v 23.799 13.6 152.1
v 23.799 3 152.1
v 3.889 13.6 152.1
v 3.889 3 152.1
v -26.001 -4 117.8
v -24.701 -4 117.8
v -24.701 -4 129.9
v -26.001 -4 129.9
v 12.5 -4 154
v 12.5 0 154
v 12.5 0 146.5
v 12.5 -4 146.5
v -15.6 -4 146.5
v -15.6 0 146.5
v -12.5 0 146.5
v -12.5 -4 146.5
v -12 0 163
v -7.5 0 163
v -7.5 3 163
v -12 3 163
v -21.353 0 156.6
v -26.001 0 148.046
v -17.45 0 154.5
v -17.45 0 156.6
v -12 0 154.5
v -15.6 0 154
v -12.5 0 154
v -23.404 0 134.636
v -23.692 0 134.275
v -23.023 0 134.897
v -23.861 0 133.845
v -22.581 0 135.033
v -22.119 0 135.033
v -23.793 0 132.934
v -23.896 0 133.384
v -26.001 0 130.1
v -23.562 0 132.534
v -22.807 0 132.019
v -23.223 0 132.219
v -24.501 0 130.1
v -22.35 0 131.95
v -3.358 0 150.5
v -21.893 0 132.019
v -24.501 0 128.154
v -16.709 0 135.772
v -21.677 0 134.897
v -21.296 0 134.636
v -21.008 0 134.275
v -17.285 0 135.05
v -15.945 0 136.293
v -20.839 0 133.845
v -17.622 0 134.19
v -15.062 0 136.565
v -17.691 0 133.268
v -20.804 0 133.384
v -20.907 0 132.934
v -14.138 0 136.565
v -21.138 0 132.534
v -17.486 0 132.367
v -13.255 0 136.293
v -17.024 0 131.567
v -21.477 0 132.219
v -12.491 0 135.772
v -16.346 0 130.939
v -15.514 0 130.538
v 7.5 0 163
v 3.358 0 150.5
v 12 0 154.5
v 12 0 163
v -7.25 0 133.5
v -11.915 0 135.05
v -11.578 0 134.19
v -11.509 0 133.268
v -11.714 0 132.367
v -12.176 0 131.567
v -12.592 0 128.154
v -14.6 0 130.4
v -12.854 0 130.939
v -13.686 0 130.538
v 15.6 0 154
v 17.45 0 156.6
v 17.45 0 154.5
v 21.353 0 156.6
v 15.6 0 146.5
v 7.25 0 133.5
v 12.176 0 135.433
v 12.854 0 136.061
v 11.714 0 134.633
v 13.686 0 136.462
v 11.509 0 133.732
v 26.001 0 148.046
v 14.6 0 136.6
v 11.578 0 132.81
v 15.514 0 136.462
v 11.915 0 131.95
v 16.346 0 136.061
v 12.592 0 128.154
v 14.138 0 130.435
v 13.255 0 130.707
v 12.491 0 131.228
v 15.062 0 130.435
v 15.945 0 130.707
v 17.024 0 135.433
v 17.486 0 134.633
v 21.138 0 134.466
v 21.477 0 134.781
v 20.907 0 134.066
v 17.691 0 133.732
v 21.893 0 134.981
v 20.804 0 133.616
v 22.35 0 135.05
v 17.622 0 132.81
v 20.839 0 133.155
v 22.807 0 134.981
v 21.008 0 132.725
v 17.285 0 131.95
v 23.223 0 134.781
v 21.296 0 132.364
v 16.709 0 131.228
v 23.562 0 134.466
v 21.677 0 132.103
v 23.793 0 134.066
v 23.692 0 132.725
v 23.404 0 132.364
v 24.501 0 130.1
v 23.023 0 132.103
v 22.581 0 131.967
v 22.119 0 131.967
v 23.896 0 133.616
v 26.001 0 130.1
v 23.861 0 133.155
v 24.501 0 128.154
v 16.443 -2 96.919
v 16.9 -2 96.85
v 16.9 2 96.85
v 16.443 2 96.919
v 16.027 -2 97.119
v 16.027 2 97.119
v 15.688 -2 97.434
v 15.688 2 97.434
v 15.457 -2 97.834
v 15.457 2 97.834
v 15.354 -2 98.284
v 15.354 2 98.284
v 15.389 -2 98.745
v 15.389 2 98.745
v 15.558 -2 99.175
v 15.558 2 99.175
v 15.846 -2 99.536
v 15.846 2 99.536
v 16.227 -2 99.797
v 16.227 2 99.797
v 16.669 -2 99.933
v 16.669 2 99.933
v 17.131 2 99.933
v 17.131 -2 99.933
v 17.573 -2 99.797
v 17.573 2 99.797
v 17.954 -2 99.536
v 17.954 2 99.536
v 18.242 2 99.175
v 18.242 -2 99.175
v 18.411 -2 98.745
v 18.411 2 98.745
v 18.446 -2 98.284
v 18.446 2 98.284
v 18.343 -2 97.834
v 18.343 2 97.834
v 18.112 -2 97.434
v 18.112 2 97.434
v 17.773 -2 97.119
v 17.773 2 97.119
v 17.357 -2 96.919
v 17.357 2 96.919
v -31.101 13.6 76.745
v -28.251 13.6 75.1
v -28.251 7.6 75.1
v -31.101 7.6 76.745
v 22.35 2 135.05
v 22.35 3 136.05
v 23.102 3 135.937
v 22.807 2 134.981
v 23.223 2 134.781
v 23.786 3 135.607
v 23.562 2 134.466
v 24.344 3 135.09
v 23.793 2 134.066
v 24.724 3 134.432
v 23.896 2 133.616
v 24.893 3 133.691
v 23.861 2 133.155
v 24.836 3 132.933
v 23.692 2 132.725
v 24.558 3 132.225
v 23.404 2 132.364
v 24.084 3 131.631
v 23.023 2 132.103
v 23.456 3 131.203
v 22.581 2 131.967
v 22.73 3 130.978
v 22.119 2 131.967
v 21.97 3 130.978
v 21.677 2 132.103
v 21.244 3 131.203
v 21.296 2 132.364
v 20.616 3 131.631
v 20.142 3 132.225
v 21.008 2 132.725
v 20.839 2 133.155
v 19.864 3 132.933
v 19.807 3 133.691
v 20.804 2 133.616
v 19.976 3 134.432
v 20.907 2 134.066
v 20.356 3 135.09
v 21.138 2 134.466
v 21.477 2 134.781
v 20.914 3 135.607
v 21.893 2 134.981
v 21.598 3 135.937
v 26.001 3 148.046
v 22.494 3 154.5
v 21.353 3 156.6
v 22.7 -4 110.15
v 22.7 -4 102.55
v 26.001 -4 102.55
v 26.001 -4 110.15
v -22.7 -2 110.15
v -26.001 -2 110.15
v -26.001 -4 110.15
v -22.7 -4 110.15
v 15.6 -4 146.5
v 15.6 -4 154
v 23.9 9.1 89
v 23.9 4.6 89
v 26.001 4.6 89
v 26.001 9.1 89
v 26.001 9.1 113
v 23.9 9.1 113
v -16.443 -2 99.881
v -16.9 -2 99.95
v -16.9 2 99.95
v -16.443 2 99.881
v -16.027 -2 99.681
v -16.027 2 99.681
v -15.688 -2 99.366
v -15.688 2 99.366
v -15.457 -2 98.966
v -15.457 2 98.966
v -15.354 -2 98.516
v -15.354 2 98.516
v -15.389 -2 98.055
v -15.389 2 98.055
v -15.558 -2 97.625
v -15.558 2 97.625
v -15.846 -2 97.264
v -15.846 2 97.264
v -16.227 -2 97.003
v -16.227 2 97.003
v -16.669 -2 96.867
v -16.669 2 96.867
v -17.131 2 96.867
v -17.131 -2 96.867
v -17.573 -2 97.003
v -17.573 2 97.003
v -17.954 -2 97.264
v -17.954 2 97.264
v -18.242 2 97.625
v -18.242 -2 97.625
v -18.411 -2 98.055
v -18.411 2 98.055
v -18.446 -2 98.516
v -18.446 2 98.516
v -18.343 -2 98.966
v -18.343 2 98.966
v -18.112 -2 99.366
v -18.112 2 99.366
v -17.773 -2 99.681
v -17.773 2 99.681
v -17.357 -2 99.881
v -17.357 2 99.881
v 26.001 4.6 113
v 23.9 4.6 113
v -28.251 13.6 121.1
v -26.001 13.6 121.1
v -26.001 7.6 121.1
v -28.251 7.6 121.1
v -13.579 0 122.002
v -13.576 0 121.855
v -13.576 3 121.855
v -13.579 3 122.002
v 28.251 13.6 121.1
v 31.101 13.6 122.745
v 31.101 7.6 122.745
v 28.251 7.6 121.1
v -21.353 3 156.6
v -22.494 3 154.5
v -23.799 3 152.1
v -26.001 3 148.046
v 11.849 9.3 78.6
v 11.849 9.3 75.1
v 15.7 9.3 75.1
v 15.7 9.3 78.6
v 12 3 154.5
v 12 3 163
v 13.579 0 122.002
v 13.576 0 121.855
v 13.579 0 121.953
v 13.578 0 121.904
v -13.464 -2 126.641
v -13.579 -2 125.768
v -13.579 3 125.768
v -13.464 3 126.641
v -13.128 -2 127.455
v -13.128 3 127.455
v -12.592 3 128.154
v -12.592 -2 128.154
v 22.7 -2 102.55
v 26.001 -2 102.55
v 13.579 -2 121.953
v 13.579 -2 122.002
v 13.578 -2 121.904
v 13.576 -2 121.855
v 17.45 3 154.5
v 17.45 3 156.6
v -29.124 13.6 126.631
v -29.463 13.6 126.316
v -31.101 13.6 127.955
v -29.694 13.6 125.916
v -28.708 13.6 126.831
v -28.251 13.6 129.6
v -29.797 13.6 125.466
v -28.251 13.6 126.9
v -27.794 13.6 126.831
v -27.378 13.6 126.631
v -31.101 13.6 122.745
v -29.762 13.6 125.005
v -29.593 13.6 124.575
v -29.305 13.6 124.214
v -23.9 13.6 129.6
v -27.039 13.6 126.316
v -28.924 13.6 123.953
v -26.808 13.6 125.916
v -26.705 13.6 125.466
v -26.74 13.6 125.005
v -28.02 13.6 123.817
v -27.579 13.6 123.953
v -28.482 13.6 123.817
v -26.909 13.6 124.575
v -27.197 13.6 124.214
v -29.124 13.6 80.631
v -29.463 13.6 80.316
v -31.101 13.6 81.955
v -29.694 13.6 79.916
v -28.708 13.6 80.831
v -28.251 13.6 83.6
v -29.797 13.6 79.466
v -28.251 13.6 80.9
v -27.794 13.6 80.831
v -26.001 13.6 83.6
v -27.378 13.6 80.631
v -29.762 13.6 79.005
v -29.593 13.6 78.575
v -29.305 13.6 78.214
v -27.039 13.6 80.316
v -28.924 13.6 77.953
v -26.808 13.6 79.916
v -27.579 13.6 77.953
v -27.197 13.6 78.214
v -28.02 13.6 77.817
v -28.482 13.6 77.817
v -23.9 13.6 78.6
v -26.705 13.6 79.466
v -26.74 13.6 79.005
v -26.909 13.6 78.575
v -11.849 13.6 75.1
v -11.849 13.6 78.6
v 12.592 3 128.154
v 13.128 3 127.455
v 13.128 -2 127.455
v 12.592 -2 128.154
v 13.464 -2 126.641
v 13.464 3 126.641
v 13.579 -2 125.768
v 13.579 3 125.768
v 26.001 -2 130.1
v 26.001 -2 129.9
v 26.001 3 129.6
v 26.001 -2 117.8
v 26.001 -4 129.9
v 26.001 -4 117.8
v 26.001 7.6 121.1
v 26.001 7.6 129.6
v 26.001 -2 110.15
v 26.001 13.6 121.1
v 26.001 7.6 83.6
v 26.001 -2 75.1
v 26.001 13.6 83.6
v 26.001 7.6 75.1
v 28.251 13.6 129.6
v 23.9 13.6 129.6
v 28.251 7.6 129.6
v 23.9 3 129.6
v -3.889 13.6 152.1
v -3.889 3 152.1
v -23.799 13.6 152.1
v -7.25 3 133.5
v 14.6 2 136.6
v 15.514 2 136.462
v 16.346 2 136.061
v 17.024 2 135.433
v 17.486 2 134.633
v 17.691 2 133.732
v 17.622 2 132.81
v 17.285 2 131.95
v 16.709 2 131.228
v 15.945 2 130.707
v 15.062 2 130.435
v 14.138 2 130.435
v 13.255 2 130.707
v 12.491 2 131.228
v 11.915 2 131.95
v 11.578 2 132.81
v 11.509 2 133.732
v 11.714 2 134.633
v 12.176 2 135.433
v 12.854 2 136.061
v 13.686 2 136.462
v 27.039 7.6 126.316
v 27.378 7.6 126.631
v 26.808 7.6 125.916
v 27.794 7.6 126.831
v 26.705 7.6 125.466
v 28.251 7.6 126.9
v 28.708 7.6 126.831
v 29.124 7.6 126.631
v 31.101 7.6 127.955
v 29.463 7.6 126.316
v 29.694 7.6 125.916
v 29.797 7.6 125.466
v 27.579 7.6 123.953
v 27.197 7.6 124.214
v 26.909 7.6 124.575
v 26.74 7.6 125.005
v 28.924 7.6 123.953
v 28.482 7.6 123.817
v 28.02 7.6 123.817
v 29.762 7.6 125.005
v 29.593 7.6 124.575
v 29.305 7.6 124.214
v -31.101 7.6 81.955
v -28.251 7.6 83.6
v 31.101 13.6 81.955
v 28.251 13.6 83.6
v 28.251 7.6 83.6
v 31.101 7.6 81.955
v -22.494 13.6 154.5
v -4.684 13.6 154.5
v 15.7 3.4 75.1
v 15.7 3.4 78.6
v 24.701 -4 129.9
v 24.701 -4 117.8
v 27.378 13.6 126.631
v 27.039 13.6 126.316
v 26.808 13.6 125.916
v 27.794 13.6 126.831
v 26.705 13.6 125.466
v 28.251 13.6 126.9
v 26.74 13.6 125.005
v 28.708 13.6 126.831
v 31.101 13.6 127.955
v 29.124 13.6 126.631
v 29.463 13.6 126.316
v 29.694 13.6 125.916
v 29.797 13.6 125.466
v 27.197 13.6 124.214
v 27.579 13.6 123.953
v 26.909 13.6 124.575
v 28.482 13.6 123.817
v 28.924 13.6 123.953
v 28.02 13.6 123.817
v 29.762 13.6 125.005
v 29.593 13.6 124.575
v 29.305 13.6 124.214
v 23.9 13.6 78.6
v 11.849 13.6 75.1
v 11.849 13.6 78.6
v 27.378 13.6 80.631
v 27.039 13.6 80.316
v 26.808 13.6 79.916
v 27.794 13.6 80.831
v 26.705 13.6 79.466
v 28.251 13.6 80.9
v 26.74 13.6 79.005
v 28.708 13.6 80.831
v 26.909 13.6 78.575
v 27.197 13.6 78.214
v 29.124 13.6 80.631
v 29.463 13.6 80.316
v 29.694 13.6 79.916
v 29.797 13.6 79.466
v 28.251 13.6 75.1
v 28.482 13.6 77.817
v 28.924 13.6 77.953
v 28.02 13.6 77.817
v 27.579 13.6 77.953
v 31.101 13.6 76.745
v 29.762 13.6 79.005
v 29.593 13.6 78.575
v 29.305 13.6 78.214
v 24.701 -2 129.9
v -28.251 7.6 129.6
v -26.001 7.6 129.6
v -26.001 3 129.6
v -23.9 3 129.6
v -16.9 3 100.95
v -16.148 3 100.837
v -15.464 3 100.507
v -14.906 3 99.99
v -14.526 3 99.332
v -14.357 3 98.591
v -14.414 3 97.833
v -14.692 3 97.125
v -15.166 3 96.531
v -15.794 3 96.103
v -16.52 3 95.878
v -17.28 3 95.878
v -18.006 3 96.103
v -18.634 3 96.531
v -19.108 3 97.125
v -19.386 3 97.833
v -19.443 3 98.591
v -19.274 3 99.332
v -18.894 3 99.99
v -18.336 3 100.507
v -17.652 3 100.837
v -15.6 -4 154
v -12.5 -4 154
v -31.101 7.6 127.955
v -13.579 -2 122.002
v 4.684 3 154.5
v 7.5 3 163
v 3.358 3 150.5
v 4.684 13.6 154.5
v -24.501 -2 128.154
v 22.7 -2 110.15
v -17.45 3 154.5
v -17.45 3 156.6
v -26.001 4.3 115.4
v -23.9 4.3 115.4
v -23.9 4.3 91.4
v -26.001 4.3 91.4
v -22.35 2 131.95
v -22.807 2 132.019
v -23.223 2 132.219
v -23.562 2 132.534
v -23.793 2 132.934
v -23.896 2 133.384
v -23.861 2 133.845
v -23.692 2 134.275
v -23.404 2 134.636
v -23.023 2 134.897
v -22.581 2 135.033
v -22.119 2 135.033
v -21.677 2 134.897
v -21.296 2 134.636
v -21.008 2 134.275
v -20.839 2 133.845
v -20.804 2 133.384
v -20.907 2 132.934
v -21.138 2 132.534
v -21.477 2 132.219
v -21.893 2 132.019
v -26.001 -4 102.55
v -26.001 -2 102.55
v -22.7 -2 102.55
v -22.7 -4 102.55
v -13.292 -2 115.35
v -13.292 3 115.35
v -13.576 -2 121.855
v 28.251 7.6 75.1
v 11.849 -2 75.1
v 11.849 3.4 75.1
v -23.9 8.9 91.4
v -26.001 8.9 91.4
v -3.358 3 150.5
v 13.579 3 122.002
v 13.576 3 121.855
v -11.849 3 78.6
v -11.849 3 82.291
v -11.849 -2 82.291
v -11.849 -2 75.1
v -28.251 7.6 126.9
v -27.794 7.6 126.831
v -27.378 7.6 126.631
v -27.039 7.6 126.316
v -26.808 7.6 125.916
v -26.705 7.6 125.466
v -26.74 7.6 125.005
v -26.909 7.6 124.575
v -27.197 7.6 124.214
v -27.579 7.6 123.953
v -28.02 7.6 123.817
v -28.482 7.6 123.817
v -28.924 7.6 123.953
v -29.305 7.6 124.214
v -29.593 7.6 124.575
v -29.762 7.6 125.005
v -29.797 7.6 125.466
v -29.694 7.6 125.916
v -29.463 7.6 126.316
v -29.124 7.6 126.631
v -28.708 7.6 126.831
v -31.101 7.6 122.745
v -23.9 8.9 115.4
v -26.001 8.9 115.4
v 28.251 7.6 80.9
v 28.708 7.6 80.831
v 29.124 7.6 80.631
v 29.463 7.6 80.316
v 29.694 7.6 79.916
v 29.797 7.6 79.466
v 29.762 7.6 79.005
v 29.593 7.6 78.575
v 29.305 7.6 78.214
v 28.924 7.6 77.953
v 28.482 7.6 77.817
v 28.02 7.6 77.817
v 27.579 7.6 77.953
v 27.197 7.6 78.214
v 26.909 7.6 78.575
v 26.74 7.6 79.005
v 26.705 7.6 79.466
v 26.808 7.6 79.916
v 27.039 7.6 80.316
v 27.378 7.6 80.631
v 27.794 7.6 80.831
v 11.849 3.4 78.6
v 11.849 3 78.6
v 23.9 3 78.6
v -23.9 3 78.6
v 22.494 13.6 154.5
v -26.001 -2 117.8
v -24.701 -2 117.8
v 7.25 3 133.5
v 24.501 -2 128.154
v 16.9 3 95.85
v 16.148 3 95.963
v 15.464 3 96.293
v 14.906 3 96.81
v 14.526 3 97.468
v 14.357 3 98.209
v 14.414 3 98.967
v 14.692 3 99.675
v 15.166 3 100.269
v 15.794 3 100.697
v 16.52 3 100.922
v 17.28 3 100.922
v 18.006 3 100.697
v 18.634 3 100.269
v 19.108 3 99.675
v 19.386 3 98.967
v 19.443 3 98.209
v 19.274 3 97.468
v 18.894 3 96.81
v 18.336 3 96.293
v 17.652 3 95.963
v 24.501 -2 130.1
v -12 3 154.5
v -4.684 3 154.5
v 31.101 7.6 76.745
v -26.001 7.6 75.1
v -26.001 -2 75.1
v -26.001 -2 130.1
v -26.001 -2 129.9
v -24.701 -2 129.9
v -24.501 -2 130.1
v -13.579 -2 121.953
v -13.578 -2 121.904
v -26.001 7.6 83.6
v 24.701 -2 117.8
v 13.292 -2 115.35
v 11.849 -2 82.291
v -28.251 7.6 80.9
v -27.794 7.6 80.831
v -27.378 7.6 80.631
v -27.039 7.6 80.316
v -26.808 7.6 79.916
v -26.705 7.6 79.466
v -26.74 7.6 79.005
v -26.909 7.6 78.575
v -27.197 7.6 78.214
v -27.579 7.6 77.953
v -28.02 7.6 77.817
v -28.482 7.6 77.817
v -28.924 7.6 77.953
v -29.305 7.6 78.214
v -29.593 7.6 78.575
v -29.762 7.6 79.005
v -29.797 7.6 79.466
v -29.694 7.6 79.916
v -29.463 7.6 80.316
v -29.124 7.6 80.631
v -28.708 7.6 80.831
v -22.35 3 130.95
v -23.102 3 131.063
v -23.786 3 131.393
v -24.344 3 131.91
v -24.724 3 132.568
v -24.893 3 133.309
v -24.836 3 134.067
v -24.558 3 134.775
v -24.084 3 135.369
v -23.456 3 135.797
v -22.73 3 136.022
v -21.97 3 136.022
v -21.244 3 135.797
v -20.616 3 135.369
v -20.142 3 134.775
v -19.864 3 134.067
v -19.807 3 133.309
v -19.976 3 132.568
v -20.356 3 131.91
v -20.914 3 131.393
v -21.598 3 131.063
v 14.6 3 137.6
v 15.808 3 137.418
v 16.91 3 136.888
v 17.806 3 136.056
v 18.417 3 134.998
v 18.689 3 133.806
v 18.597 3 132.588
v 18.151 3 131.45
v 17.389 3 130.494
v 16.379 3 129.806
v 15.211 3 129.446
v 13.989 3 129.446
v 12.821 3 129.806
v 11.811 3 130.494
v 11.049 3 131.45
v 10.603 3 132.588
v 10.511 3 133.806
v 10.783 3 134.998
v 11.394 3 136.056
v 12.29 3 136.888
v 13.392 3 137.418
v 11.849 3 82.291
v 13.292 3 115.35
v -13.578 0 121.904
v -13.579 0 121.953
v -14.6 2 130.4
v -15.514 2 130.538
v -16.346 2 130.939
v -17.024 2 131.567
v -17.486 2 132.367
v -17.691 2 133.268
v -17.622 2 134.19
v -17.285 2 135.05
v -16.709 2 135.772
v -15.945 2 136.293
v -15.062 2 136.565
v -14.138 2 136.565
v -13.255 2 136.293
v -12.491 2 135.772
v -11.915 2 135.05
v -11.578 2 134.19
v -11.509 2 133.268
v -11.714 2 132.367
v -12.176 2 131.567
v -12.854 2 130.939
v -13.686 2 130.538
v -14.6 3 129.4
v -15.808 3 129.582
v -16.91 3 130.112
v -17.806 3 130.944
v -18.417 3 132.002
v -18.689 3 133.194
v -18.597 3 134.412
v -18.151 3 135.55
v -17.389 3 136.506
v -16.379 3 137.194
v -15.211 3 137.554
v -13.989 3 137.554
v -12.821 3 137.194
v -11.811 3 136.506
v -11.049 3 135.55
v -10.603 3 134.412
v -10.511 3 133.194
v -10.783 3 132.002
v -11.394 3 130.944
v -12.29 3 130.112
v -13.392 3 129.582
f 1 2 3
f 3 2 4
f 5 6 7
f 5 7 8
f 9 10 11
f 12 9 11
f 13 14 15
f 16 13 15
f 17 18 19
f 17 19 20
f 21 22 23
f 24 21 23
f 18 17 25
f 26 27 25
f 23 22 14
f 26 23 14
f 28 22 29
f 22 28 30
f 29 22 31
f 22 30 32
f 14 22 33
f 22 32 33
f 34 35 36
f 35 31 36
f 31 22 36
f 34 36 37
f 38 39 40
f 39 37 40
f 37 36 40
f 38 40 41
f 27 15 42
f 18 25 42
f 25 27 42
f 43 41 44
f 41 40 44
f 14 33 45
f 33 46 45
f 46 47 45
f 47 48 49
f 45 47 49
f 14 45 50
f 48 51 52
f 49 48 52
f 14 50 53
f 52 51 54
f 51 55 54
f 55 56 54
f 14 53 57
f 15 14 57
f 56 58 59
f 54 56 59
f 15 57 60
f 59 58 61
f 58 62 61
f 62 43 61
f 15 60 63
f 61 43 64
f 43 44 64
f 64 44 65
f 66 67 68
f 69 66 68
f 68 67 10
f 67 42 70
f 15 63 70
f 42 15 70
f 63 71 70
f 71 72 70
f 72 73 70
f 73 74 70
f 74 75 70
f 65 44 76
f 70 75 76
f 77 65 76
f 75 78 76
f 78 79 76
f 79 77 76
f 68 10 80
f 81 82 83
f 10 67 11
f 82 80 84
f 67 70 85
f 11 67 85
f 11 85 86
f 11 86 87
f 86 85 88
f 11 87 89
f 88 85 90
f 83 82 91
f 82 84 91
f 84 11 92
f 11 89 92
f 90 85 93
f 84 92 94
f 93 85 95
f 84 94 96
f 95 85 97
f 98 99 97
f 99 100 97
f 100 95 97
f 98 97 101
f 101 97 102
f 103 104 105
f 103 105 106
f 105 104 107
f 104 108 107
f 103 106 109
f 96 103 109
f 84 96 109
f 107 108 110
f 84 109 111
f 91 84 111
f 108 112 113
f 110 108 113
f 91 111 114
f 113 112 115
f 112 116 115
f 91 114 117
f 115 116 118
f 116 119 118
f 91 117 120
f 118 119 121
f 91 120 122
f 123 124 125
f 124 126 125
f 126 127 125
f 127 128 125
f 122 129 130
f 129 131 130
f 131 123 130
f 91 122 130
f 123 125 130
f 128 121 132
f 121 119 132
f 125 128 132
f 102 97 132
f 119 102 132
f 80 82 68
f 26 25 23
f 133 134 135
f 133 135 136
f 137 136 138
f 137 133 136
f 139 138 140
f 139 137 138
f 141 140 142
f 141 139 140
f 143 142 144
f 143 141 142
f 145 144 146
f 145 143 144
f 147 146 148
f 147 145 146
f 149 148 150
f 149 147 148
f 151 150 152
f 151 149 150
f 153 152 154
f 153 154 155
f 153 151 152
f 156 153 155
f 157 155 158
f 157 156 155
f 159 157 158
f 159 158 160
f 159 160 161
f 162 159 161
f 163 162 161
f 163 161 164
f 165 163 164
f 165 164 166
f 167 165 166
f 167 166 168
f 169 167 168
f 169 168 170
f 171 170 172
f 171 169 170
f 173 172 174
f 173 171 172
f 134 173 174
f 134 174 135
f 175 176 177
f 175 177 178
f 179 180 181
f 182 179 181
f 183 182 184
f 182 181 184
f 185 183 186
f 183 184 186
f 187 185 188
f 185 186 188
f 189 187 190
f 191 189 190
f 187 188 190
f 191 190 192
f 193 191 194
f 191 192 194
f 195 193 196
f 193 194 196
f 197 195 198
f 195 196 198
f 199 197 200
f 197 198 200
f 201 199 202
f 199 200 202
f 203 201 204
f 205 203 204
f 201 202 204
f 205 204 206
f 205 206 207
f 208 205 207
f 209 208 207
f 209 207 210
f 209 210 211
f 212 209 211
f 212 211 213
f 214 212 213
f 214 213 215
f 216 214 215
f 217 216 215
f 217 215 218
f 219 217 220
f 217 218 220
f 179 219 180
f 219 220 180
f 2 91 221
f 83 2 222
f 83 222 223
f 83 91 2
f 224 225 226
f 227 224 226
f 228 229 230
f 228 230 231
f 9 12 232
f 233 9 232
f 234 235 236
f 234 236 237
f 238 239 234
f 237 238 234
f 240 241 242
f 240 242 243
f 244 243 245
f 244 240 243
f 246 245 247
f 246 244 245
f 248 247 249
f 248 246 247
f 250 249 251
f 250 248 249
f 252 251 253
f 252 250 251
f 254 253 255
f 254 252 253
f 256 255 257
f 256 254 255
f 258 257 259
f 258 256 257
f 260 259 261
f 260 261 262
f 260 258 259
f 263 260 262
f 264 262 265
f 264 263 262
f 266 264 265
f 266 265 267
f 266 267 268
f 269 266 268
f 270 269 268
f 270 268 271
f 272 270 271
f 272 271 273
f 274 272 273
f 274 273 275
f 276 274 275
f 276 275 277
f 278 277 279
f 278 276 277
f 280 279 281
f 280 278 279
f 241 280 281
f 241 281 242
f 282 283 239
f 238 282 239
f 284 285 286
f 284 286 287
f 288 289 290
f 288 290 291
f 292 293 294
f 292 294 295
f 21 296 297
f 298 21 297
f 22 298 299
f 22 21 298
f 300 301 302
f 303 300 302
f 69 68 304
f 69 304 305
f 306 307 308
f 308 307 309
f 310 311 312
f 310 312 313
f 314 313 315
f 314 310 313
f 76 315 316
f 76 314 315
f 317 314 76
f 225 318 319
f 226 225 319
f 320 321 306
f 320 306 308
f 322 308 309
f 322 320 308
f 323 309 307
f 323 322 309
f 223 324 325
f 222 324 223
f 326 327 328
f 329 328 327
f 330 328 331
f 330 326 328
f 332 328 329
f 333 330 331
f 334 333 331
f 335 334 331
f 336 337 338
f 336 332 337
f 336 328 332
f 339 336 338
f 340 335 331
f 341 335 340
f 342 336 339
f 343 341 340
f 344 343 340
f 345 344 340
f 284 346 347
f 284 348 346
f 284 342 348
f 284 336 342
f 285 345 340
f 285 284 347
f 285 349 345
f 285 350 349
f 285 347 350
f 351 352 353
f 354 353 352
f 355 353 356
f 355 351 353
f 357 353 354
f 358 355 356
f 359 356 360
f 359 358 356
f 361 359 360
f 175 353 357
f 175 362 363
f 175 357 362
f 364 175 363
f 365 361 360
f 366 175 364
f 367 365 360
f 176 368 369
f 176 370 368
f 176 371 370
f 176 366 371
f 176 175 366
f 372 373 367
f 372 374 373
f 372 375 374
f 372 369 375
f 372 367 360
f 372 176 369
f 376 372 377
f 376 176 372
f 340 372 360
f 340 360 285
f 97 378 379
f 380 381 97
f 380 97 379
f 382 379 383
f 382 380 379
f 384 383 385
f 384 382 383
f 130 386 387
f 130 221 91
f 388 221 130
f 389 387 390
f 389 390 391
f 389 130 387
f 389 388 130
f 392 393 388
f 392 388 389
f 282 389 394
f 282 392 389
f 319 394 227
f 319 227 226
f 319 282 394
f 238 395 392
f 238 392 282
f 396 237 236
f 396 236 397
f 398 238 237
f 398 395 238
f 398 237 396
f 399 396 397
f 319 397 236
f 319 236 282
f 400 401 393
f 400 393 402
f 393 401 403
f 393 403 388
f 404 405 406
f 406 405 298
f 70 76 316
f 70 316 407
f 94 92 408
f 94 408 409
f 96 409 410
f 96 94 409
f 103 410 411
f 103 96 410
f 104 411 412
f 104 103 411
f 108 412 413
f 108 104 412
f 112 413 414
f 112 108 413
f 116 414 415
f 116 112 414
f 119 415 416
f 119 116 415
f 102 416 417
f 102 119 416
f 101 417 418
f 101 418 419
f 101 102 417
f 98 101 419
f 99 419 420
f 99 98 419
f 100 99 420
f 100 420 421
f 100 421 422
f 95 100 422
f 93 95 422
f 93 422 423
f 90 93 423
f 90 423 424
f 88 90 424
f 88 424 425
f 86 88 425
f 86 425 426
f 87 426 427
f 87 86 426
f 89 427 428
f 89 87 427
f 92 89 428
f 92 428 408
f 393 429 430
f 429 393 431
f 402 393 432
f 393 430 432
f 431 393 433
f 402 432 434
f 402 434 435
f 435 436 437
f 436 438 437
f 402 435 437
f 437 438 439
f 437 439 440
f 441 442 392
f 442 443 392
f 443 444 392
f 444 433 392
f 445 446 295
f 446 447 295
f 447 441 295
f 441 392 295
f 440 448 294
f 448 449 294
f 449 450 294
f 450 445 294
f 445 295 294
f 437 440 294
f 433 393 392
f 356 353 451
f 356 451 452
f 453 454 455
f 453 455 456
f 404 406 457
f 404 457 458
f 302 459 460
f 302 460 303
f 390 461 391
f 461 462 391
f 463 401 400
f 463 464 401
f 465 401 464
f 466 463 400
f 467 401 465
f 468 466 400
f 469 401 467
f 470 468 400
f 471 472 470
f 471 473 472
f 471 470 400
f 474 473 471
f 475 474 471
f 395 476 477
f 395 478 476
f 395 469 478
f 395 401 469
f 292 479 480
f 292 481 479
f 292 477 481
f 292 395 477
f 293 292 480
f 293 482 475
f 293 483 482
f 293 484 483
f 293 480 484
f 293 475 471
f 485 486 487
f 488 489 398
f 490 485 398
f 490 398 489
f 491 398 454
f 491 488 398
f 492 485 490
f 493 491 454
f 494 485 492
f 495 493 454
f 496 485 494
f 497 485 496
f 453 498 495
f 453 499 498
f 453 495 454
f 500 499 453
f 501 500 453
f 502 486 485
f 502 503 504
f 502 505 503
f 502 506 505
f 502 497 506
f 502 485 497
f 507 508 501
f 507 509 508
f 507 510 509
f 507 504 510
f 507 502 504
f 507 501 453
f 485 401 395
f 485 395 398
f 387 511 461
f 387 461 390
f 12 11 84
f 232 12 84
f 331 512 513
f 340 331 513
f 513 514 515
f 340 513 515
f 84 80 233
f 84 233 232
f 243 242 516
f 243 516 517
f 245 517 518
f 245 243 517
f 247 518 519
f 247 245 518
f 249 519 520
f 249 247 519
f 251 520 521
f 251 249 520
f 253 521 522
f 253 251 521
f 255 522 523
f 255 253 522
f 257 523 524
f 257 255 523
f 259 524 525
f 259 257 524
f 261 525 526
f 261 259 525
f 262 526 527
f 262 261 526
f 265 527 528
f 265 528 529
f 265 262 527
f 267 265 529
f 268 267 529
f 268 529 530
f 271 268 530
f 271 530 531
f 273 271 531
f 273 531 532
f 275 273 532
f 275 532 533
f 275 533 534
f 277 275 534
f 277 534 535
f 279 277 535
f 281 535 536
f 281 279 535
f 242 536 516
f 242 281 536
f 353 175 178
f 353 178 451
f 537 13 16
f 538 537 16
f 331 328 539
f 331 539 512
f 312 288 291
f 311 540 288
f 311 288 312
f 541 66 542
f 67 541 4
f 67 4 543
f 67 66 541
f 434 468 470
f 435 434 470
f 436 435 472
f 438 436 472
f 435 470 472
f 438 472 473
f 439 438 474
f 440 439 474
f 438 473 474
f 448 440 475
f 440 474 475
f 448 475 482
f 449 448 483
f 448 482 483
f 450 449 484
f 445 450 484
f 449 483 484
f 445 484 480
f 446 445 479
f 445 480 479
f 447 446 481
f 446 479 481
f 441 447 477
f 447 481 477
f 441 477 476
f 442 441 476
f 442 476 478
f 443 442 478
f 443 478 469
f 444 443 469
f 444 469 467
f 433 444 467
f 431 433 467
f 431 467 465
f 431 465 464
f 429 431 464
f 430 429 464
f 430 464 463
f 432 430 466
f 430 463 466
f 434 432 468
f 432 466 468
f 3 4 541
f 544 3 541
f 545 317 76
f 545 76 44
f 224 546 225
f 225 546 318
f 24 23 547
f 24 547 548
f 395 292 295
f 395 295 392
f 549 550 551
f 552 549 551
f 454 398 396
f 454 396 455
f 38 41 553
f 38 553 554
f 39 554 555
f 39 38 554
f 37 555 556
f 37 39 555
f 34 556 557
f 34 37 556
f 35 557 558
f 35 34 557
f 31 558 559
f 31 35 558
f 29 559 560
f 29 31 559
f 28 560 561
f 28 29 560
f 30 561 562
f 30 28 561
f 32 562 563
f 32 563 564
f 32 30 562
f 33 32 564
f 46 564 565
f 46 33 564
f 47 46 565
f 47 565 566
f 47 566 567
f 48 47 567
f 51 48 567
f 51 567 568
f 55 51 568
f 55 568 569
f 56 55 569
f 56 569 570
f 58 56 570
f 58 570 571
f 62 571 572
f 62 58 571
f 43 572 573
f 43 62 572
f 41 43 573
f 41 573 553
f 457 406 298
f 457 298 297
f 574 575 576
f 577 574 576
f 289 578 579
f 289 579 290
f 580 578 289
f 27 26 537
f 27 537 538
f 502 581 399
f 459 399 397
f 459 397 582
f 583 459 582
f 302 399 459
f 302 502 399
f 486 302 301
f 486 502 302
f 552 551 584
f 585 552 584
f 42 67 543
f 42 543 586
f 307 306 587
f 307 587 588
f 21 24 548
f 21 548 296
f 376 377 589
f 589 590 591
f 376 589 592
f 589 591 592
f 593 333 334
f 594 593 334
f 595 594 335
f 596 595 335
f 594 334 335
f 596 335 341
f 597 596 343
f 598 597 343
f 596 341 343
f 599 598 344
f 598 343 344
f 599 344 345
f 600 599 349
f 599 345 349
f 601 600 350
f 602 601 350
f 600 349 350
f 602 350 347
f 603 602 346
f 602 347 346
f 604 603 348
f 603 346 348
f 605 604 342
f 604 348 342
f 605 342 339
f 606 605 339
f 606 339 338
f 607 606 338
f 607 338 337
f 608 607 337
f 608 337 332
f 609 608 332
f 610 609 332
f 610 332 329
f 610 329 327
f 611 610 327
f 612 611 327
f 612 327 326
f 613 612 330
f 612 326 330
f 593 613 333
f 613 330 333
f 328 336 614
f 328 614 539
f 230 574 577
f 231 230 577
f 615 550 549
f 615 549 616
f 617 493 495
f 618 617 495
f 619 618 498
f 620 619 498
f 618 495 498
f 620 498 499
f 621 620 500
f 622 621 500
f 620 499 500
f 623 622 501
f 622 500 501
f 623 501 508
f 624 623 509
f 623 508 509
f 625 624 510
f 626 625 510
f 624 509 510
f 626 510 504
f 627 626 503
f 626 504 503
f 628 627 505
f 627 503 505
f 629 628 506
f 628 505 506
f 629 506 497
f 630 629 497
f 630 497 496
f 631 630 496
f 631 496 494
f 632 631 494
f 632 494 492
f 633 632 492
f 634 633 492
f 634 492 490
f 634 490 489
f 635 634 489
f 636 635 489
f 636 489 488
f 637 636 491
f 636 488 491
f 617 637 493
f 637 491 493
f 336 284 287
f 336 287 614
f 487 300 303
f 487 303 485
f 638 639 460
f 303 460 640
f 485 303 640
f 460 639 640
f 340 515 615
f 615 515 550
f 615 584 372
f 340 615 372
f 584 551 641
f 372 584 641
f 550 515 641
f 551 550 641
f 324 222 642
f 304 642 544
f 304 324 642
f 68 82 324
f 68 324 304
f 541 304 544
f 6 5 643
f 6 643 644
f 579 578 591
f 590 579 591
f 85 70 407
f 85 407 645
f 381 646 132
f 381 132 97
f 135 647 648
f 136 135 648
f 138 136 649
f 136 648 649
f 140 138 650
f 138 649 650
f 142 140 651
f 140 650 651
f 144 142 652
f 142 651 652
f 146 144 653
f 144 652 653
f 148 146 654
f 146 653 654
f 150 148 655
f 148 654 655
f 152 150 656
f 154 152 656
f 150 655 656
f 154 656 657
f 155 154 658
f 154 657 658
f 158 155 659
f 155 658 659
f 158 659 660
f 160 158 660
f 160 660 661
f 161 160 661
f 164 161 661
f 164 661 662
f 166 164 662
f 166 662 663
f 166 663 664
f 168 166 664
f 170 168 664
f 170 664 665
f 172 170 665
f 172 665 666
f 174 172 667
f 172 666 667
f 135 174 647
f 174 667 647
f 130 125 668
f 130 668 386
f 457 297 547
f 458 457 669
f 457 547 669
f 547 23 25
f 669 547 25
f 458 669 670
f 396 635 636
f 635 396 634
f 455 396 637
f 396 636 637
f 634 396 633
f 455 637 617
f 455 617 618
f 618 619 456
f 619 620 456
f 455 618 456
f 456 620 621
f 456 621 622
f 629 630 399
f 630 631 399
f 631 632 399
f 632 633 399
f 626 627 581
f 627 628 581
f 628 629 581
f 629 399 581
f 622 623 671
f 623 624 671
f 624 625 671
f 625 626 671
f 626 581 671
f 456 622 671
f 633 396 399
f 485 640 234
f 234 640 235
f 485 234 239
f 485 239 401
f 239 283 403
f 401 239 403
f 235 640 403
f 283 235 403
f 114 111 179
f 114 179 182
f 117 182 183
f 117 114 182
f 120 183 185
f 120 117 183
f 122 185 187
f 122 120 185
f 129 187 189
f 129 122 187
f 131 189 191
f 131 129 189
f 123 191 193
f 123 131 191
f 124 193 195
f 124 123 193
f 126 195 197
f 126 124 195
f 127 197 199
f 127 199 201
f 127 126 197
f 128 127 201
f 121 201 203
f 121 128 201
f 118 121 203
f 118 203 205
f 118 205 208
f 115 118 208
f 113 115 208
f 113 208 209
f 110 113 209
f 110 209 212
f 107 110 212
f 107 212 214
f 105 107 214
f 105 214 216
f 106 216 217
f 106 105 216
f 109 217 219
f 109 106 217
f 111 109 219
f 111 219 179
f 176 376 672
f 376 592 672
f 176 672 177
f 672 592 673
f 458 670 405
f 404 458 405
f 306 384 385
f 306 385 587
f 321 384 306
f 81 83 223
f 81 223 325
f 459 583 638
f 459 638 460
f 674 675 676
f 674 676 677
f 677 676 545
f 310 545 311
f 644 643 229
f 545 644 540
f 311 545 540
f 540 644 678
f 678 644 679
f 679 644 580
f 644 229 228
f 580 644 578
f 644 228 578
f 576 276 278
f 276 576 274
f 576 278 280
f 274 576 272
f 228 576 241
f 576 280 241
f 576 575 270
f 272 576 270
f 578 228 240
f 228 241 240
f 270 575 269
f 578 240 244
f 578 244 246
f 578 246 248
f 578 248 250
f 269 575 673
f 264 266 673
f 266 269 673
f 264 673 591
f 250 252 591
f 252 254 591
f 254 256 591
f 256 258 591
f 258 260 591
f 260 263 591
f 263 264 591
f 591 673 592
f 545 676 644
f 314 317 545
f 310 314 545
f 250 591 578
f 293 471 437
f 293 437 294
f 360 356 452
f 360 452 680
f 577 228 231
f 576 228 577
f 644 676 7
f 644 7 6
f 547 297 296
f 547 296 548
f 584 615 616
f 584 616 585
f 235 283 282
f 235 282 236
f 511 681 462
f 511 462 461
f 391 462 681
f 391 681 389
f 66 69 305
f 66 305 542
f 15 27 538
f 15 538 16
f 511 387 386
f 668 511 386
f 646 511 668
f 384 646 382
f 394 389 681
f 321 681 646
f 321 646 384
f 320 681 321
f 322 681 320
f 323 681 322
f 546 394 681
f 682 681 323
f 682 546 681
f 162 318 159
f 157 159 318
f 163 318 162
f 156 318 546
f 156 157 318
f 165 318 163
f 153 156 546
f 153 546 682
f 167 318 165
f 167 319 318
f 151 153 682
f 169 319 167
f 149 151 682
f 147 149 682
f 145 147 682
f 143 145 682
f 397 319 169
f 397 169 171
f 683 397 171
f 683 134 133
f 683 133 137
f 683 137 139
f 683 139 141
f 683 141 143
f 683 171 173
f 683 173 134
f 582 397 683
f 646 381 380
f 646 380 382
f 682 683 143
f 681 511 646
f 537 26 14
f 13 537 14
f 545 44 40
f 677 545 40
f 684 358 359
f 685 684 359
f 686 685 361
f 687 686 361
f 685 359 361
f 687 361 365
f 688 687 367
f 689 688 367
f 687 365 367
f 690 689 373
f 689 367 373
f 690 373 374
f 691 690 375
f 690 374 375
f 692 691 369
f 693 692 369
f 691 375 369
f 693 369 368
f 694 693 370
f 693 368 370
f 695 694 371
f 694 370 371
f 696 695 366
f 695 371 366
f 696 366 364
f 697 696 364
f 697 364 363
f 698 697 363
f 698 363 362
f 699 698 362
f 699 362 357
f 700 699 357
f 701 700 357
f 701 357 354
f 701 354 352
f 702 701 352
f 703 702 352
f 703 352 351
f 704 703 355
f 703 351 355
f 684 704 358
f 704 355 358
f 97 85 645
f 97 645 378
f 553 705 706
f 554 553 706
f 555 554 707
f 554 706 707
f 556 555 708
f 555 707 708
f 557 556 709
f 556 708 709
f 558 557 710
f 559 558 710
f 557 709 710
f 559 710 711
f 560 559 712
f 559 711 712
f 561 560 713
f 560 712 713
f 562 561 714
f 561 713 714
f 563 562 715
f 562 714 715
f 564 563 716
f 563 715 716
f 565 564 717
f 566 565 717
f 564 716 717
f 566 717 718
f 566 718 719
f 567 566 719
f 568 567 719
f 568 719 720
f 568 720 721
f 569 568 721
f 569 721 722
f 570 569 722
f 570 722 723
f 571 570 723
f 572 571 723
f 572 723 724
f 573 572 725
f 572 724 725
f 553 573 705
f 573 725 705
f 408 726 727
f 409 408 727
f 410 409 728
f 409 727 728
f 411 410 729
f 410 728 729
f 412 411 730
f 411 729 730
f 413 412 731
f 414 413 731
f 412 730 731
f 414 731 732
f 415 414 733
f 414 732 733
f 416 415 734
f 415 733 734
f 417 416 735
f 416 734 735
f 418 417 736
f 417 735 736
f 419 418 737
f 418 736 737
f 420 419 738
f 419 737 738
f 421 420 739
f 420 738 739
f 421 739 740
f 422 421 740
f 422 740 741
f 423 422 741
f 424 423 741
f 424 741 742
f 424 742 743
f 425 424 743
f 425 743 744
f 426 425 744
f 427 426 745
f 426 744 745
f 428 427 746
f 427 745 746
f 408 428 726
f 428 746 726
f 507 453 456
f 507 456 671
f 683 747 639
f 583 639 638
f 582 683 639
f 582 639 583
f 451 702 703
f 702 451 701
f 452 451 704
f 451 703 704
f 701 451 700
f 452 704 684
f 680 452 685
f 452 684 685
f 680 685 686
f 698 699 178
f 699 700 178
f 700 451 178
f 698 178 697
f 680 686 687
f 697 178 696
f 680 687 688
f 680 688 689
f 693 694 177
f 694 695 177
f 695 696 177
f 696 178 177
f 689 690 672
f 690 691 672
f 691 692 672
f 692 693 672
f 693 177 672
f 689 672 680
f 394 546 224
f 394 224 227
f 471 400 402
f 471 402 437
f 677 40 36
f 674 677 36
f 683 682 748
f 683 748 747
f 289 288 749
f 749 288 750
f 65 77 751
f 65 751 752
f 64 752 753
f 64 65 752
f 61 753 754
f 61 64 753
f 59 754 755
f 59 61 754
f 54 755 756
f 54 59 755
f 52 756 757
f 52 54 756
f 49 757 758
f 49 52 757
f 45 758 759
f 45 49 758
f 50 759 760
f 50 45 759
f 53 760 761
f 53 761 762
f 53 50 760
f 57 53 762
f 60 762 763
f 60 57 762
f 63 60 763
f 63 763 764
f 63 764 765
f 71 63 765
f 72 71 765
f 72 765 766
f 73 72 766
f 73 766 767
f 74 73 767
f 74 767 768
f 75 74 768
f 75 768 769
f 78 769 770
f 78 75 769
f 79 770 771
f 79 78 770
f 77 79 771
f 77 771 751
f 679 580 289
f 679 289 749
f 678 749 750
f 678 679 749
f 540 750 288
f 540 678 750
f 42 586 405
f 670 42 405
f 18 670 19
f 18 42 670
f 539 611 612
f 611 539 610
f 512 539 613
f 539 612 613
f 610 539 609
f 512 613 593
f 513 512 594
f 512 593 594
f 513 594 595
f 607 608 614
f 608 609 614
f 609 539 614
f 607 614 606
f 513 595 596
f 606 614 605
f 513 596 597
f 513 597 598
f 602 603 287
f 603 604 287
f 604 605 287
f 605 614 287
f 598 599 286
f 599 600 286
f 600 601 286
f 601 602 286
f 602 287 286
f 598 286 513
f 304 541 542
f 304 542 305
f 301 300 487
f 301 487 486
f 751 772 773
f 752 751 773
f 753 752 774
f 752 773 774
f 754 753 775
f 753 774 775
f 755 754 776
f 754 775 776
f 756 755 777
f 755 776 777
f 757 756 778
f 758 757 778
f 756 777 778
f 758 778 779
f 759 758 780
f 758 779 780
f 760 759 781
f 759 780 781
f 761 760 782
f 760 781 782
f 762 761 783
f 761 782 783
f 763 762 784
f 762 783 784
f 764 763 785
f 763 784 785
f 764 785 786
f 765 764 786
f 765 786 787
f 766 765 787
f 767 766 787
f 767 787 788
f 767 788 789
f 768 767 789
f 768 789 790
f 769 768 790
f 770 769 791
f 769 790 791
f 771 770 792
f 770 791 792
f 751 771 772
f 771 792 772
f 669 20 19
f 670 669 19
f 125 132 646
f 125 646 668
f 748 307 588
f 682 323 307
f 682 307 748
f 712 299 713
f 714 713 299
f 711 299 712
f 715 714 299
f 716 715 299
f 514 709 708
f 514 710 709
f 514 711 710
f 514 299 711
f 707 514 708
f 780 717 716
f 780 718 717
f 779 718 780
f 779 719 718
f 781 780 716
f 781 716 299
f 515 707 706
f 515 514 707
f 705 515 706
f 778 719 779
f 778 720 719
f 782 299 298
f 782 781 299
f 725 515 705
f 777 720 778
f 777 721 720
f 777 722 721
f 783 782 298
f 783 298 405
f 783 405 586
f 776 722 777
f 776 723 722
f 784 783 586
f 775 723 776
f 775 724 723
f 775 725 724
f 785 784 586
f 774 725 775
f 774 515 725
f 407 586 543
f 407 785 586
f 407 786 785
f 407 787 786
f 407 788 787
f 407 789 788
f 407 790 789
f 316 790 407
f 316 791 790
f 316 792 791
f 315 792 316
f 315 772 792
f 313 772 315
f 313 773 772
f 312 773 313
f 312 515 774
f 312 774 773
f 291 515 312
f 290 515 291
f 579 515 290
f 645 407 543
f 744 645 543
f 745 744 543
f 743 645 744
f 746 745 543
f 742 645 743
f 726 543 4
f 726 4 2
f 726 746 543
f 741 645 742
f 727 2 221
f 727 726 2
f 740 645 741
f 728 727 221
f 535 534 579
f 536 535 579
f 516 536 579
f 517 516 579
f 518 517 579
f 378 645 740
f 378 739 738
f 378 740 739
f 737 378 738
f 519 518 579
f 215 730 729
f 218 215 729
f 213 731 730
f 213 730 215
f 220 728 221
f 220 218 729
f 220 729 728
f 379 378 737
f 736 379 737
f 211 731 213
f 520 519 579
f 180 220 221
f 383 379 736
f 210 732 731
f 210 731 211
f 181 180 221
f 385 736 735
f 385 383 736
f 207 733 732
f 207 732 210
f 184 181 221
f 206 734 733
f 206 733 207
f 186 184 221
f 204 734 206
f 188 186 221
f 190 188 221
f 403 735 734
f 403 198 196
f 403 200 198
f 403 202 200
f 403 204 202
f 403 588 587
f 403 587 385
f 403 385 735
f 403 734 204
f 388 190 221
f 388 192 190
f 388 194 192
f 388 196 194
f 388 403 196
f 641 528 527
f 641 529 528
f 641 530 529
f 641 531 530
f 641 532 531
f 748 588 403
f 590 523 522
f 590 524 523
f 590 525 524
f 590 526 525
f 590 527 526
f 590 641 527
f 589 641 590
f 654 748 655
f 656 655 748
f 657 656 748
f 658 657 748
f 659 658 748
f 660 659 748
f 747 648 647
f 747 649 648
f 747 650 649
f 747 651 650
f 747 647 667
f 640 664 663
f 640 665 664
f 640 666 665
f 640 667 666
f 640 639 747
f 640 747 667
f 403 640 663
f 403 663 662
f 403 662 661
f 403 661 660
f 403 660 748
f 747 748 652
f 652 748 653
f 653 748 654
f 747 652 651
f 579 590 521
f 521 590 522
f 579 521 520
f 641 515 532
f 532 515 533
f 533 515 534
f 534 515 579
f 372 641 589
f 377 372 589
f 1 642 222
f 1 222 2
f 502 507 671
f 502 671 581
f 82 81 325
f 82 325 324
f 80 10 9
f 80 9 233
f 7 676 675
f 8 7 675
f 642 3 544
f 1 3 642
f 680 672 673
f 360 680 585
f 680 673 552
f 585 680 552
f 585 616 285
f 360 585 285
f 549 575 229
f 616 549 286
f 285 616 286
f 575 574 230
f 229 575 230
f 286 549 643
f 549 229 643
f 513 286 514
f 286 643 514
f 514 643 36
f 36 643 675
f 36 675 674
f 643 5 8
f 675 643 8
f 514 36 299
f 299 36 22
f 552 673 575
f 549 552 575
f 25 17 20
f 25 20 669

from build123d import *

# Parameters (mm, degrees)
SKETCH_12157_R           = 1.55
SKETCH_12157_R_2         = 3.1
F_3MM_1_5MM_DEPTH        = 3
EXTRUDE_START            = -2
EXTRUDE_25031_DEPTH      = 2
SKETCH_5_W               = 4.1
SKETCH_5_H               = 8.5
SKETCH_5_W_2             = 3.1
SKETCH_5_H_2             = 7.5
EXTRUDE_32283_DEPTH      = 3
EXTRUDE_2_DEPTH          = 2
EXTRUDE_START_2          = 3
SKETCH_5_5_W             = 3.1
SKETCH_5_5_H             = 7.5
EXTRUDE_33009_DEPTH      = 7
EXTRUDE_34199_DEPTH      = 3
EXTRUDE_34199_DEPTH_BACK = 2
SKETCH2_R                = 1.55
SKETCH3_W                = 3.301126091
SKETCH3_H                = 7.6
SKETCH3_W_2              = 1.3
SKETCH3_H_2              = 12.1
EXTRUDE_40784_DEPTH      = 4
CHAMFER_40857_SIZE       = 1
EXTRUDE_42917_DEPTH      = 10.6
EXTRUDE_START_3          = 13.6
SKETCH_10_R              = 1.55
EXTRUDE_3_DEPTH          = 6
SKETCH_43735_W           = 24
SKETCH_43735_H           = 4.5
SKETCH_43735_W_2         = 23
SKETCH_43735_H_2         = 3.5
CUT_EXTRUDE_45378_DEPTH  = 167.496967072
SKETCH_44281_W           = 24
SKETCH_44281_H           = 4.6
SKETCH_44281_W_2         = 23
SKETCH_44281_H_2         = 3.6
CUT_EXTRUDE_45445_DEPTH  = 167.496967072
XT30_START               = 75.1
XT30_2_W                 = 11.2
XT30_2_H                 = 5.9
XT30_2_W_2               = 10.2
XT30_2_H_2               = 4.9
XT30_DEPTH               = 77


with BuildPart() as part:
    # Sketch 12157 → 基座_3mm_留线槽空间1.5mm (new body)
    with BuildSketch(Plane(origin=(0, 0, 0), x_dir=(1, 0, 0), z_dir=(0, 1, 0))):
        with BuildLine():
            Line((-24.501126091, -125.026398932), (-17.042092951, -115.35))
            Line((-17.042092951, -115.35), (-13.292092951, -115.35))
            Line((-13.292092951, -115.35), (-13.576089496, -121.85459027))
            Line((-13.576089496, -121.85459027), (-13.579301748, -122.001805703))
            Line((-13.579301748, -122.001805703), (-13.579301748, -125.768411616))
            ThreePointArc((-13.579301748, -125.768411616), (-13.322655903, -127.059338556), (-12.591750717, -128.153933031))
            Line((-12.591750717, -128.153933031), (-7.25, -133.5))
            Line((-7.25, -133.5), (7.25, -133.5))
            Line((7.25, -133.5), (12.591750717, -128.153933031))
            ThreePointArc((12.591750717, -128.153933031), (13.322655903, -127.059338556), (13.579301748, -125.768411616))
            Line((13.579301748, -125.768411616), (13.579301748, -122.001805703))
            Line((13.579301748, -122.001805703), (13.576089496, -121.85459027))
            Line((13.576089496, -121.85459027), (13.292092951, -115.35))
            Line((13.292092951, -115.35), (17.042092951, -115.35))
            Line((17.042092951, -115.35), (24.501126091, -125.026398932))
            Line((24.501126091, -125.026398932), (26.001126091, -126.6))
            Line((26.001126091, -126.6), (26.001126091, -130.1))
            Line((26.001126091, -130.1), (26.001126091, -148.0463267))
            Line((26.001126091, -148.0463267), (21.353443149, -156.6))
            Line((21.353443149, -156.6), (17.45, -156.6))
            Line((17.45, -156.6), (17.45, -154.5))
            Line((17.45, -154.5), (16.1, -154.5))
            Line((16.1, -154.5), (16.1, -146))
            Line((16.1, -146), (12, -146))
            Line((12, -146), (12, -163))
            Line((12, -163), (7.5, -163))
            Line((7.5, -163), (3.358391833, -150.5))
            Line((3.358391833, -150.5), (-3.358391833, -150.5))
            Line((-3.358391833, -150.5), (-7.5, -163))
            Line((-7.5, -163), (-12, -163))
            Line((-12, -163), (-12, -146))
            Line((-12, -146), (-16.1, -146))
            Line((-16.1, -146), (-16.1, -154.5))
            Line((-16.1, -154.5), (-17.45, -154.5))
            Line((-17.45, -154.5), (-17.45, -156.6))
            Line((-17.45, -156.6), (-21.353443149, -156.6))
            Line((-21.353443149, -156.6), (-26.001126091, -148.0463267))
            Line((-26.001126091, -148.0463267), (-26.001126091, -130.1))
            Line((-26.001126091, -130.1), (-26.001126091, -126.6))
            Line((-26.001126091, -126.6), (-24.501126091, -125.026398932))
        make_face()
        with Locations(Location((-22.35, -133.5, 0), (0, 0, 90))):
            Circle(SKETCH_12157_R, mode=Mode.SUBTRACT)
        with Locations(Location((-14.6, -133.5, 0), (0, 0, 90))):
            Circle(SKETCH_12157_R_2, mode=Mode.SUBTRACT)
        with Locations(Location((14.6, -133.5, 0), (0, 0, 270))):
            Circle(SKETCH_12157_R_2, mode=Mode.SUBTRACT)
        with Locations(Location((22.35, -133.5, 0), (0, 0, 270))):
            Circle(SKETCH_12157_R, mode=Mode.SUBTRACT)
    extrude(amount=F_3MM_1_5MM_DEPTH)

    # Sketch 24747 → Extrude 25031 (add)
    with BuildSketch(Plane(origin=(0, 0, 0), x_dir=(1, 0, 0), z_dir=(0, 1, 0)).offset(EXTRUDE_START)):
        with BuildLine():
            Line((13.292092951, -115.35), (17.042092951, -115.35))
            Line((17.042092951, -115.35), (24.501126091, -125.026398932))
            Line((24.501126091, -125.026398932), (24.501126091, -128.153933031))
            Line((24.501126091, -128.153933031), (12.591750717, -128.153933031))
            ThreePointArc((12.591750717, -128.153933031), (13.322655903, -127.059338556), (13.579301748, -125.768411616))
            Line((13.579301748, -125.768411616), (13.579301748, -122.001805703))
            ThreePointArc((13.579301748, -122.001805703), (13.578498589, -121.928180466), (13.576089496, -121.85459027))
            Line((13.576089496, -121.85459027), (13.292092951, -115.35))
        make_face()
        with BuildLine():
            Line((-13.292092951, -115.35), (-13.576089496, -121.85459027))
            ThreePointArc((-13.576089496, -121.85459027), (-13.578498589, -121.928180466), (-13.579301748, -122.001805703))
            Line((-13.579301748, -122.001805703), (-13.579301748, -125.768411616))
            ThreePointArc((-13.579301748, -125.768411616), (-13.322655903, -127.059338556), (-12.591750717, -128.153933031))
            Line((-12.591750717, -128.153933031), (-24.501126091, -128.153933031))
            Line((-24.501126091, -128.153933031), (-24.501126091, -125.026398932))
            Line((-24.501126091, -125.026398932), (-17.042092951, -115.35))
            Line((-17.042092951, -115.35), (-13.292092951, -115.35))
        make_face()
    extrude(amount=EXTRUDE_25031_DEPTH)

    # 草图5 → Extrude 32283 (add)
    # profile 1 of 8: a face of its own
    with BuildSketch(Plane(origin=(0, 0, 0), x_dir=(1, 0, 0), z_dir=(0, 1, 0))):
        with Locations((-14.05, -150.25)):
            Rectangle(SKETCH_5_W, SKETCH_5_H)
        with Locations((-14.05, -150.25)):
            Rectangle(SKETCH_5_W_2, SKETCH_5_H_2, mode=Mode.SUBTRACT)
    # profile 2 of 8: a face of its own
    with BuildSketch(Plane(origin=(0, 0, 0), x_dir=(1, 0, 0), z_dir=(0, 1, 0))):
        with Locations((-14.05, -150.25)):
            Rectangle(SKETCH_5_W_2, SKETCH_5_H_2)
    # profile 3 of 8: a face of its own
    with BuildSketch(Plane(origin=(0, 0, 0), x_dir=(1, 0, 0), z_dir=(0, 1, 0))):
        with Locations((14.05, -150.25)):
            Rectangle(SKETCH_5_W, SKETCH_5_H)
        with Locations((14.05, -150.25)):
            Rectangle(SKETCH_5_W_2, SKETCH_5_H_2, mode=Mode.SUBTRACT)
    # profile 4 of 8: a face of its own
    with BuildSketch(Plane(origin=(0, 0, 0), x_dir=(1, 0, 0), z_dir=(0, 1, 0))):
        with Locations((14.05, -150.25)):
            Rectangle(SKETCH_5_W_2, SKETCH_5_H_2)
    # profile 5 of 8: a face of its own
    with BuildSketch(Plane(origin=(0, 0, 0), x_dir=(1, 0, 0), z_dir=(0, 1, 0))):
        Polygon((-24.701126091, -125.236212408), (-26.001126091, -126.6), (-26.001126091, -129.9), (-24.701126091, -129.9), align=None)
    # profile 6 of 8: a face of its own
    with BuildSketch(Plane(origin=(0, 0, 0), x_dir=(1, 0, 0), z_dir=(0, 1, 0))):
        Polygon((-26.001126091, -130.1), (-26.001126091, -129.9), (-24.701126091, -129.9), (-24.701126091, -125.236212408), (-24.501126091, -125.026398932), (-24.501126091, -130.1), align=None)
    # profile 7 of 8: a face of its own
    with BuildSketch(Plane(origin=(0, 0, 0), x_dir=(1, 0, 0), z_dir=(0, 1, 0))):
        Polygon((26.001126091, -126.6), (26.001126091, -129.9), (24.701126091, -129.9), (24.701126091, -125.236212408), align=None)
    # profile 8 of 8: a face of its own
    with BuildSketch(Plane(origin=(0, 0, 0), x_dir=(1, 0, 0), z_dir=(0, 1, 0))):
        Polygon((24.501126091, -130.1), (26.001126091, -130.1), (26.001126091, -129.9), (24.701126091, -129.9), (24.701126091, -125.236212408), (24.501126091, -125.026398932), align=None)
    extrude(amount=EXTRUDE_32283_DEPTH)

    # 草图5<6> → 结构填充-2 (add)
    with BuildSketch(Plane(origin=(0, 0, 0), x_dir=(1, 0, 0), z_dir=(0, 1, 0))):
        Polygon((26.001126091, -126.6), (26.001126091, -129.9), (24.701126091, -129.9), (24.701126091, -125.236212408), align=None)
        Polygon((24.501126091, -130.1), (26.001126091, -130.1), (26.001126091, -129.9), (24.701126091, -129.9), (24.701126091, -125.236212408), (24.501126091, -125.026398932), align=None)
        Polygon((-24.701126091, -125.236212408), (-26.001126091, -126.6), (-26.001126091, -129.9), (-24.701126091, -129.9), align=None)
        Polygon((-26.001126091, -130.1), (-26.001126091, -129.9), (-24.701126091, -129.9), (-24.701126091, -125.236212408), (-24.501126091, -125.026398932), (-24.501126091, -130.1), align=None)
    extrude(amount=-EXTRUDE_2_DEPTH)

    # 草图5<5> → Extrude 33009 (add)
    with BuildSketch(Plane(origin=(0, 0, 0), x_dir=(1, 0, 0), z_dir=(0, 1, 0)).offset(EXTRUDE_START_2)):
        with Locations((-14.05, -150.25)):
            Rectangle(SKETCH_5_5_W, SKETCH_5_5_H)
        with Locations((14.05, -150.25)):
            Rectangle(SKETCH_5_5_W, SKETCH_5_5_H)
        Polygon((-24.701126091, -125.236212408), (-24.701126091, -129.9), (-26.001126091, -129.9), (-26.001126091, -126.6), align=None)
        Polygon((24.701126091, -125.236212408), (24.701126091, -129.9), (26.001126091, -129.9), (26.001126091, -126.6), align=None)
    extrude(amount=-EXTRUDE_33009_DEPTH)

    # Sketch2 → Extrude 34199 (add, two sides: drawn at the far end of the back side and taken through both)
    # profile 1 of 2: a face of its own
    with BuildSketch(Plane(origin=(0, 0, 0), x_dir=(1, 0, 0), z_dir=(0, 1, 0)).offset(-EXTRUDE_34199_DEPTH_BACK)):
        Polygon((-24.501126091, -125.026398932), (-17.042092951, -115.35), (-13.292092951, -115.35), (-11.848710623, -82.291109542), (-11.848710623, -75.1), (-26.001126091, -75.1), (-26.001126091, -126.6), align=None)
        with Locations(Location((-16.9, -98.4, 0), (0, 0, 270))):
            Circle(SKETCH2_R, mode=Mode.SUBTRACT)
    # profile 2 of 2: a face of its own
    with BuildSketch(Plane(origin=(0, 0, 0), x_dir=(1, 0, 0), z_dir=(0, 1, 0)).offset(-EXTRUDE_34199_DEPTH_BACK)):
        Polygon((24.501126091, -125.026398932), (17.042092951, -115.35), (13.292092951, -115.35), (11.848710623, -82.291109542), (11.848710623, -75.1), (26.001126091, -75.1), (26.001126091, -126.6), align=None)
        with Locations(Location((16.9, -98.4, 0), (0, 0, 90))):
            Circle(SKETCH2_R, mode=Mode.SUBTRACT)
    extrude(amount=EXTRUDE_34199_DEPTH + EXTRUDE_34199_DEPTH_BACK)

    # Sketch3 → Extrude 40784 (add)
    with BuildSketch(Plane(origin=(0, 0, 0), x_dir=(1, 0, 0), z_dir=(0, 1, 0))):
        with Locations((-24.350563046, -106.35)):
            Rectangle(SKETCH3_W, SKETCH3_H)
        with Locations((-25.351126091, -123.85)):
            Rectangle(SKETCH3_W_2, SKETCH3_H_2)
        with Locations((25.351126091, -123.85)):
            Rectangle(SKETCH3_W_2, SKETCH3_H_2)
        with Locations((24.350563046, -106.35)):
            Rectangle(SKETCH3_W, SKETCH3_H)
    extrude(amount=-EXTRUDE_40784_DEPTH)

    # Chamfer 40857
    chamfer_40857_edges = [part.edges().sort_by_distance(p)[0] for p in [
        (22.35, 3, 131.95),
        (-22.35, 3, 135.05),
        (-14.6, 3, 136.6),
        (-16.9, 3, 96.85),
        (16.9, 3, 99.95),
        (14.6, 3, 130.4),
    ]]
    chamfer(chamfer_40857_edges, length=CHAMFER_40857_SIZE)

    # Sketch4 → Extrude 42917 (add)
    with BuildSketch(Plane(origin=(0, 3, 0), x_dir=(1, 0, 0), z_dir=(0, 1, 0))):
        Polygon((-11.848710623, -78.6), (-11.848710623, -75.1), (-26.001126091, -75.1), (-26.001126091, -129.6), (-23.9, -129.6), (-23.9, -78.6), align=None)
        Polygon((11.848710623, -78.6), (23.9, -78.6), (23.9, -129.6), (26.001126091, -129.6), (26.001126091, -75.1), (11.848710623, -75.1), align=None)
        Polygon((-3.888517679, -152.1), (-23.798541589, -152.1), (-22.494489088, -154.5), (-17.45, -154.5), (-12, -154.5), (-4.683706447, -154.5), align=None)
        Polygon((22.494489088, -154.5), (23.798541589, -152.1), (3.888517679, -152.1), (4.683706447, -154.5), (12, -154.5), (17.45, -154.5), align=None)
    extrude(amount=EXTRUDE_42917_DEPTH)

    # 草图10 → 凸台-拉伸3 (add)
    # profile 1 of 4: a face of its own
    with BuildSketch(Plane(origin=(0, 0, 0), x_dir=(1, 0, 0), z_dir=(0, 1, 0)).offset(EXTRUDE_START_3)):
        Polygon((26.001126091, -75.1), (26.001126091, -83.6), (28.251126091, -83.6), (31.101126091, -81.954551733), (31.101126091, -76.745448267), (28.251126091, -75.1), align=None)
        with Locations(Location((28.251126091, -79.35, 0), (0, 0, 270))):
            Circle(SKETCH_10_R, mode=Mode.SUBTRACT)
    # profile 2 of 4: a face of its own
    with BuildSketch(Plane(origin=(0, 0, 0), x_dir=(1, 0, 0), z_dir=(0, 1, 0)).offset(EXTRUDE_START_3)):
        Polygon((26.001126091, -129.6), (28.251126091, -129.6), (31.101126091, -127.954551733), (31.101126091, -122.745448267), (28.251126091, -121.1), (26.001126091, -121.1), align=None)
        with Locations(Location((28.251126091, -125.35, 0), (0, 0, 270))):
            Circle(SKETCH_10_R, mode=Mode.SUBTRACT)
    # profile 3 of 4: a face of its own
    with BuildSketch(Plane(origin=(0, 0, 0), x_dir=(1, 0, 0), z_dir=(0, 1, 0)).offset(EXTRUDE_START_3)):
        Polygon((-31.101126091, -127.954551733), (-28.251126091, -129.6), (-26.001126091, -129.6), (-26.001126091, -121.1), (-28.251126091, -121.1), (-31.101126091, -122.745448267), align=None)
        with Locations(Location((-28.251126091, -125.35, 0), (0, 0, 270))):
            Circle(SKETCH_10_R, mode=Mode.SUBTRACT)
    # profile 4 of 4: a face of its own
    with BuildSketch(Plane(origin=(0, 0, 0), x_dir=(1, 0, 0), z_dir=(0, 1, 0)).offset(EXTRUDE_START_3)):
        Polygon((-31.101126091, -81.954551733), (-28.251126091, -83.6), (-26.001126091, -83.6), (-26.001126091, -75.1), (-28.251126091, -75.1), (-31.101126091, -76.745448267), align=None)
        with Locations(Location((-28.251126091, -79.35, 0), (0, 0, 270))):
            Circle(SKETCH_10_R, mode=Mode.SUBTRACT)
    extrude(amount=-EXTRUDE_3_DEPTH)

    # Sketch 43735 → Cut-Extrude 45378 (cut, through all)
    # profile 1 of 2: a face of its own
    with BuildSketch(Plane(origin=(0, 0, 0), x_dir=(0, 0, -1), z_dir=(1, 0, 0))):
        with Locations((-101, 6.85)):
            Rectangle(SKETCH_43735_W, SKETCH_43735_H)
        with Locations((-101, 6.85)):
            Rectangle(SKETCH_43735_W_2, SKETCH_43735_H_2, mode=Mode.SUBTRACT)
    # profile 2 of 2: a face of its own
    with BuildSketch(Plane(origin=(0, 0, 0), x_dir=(0, 0, -1), z_dir=(1, 0, 0))):
        with Locations((-101, 6.85)):
            Rectangle(SKETCH_43735_W_2, SKETCH_43735_H_2)
    extrude(amount=CUT_EXTRUDE_45378_DEPTH, mode=Mode.SUBTRACT)

    # Sketch 44281 → Cut-Extrude 45445 (cut, through all)
    # profile 1 of 2: a face of its own
    with BuildSketch(Plane(origin=(0, 0, 0), x_dir=(0, 0, -1), z_dir=(1, 0, 0))):
        with Locations((-103.4, 6.6)):
            Rectangle(SKETCH_44281_W, SKETCH_44281_H)
        with Locations((-103.4, 6.6)):
            Rectangle(SKETCH_44281_W_2, SKETCH_44281_H_2, mode=Mode.SUBTRACT)
    # profile 2 of 2: a face of its own
    with BuildSketch(Plane(origin=(0, 0, 0), x_dir=(0, 0, -1), z_dir=(1, 0, 0))):
        with Locations((-103.4, 6.6)):
            Rectangle(SKETCH_44281_W_2, SKETCH_44281_H_2)
    extrude(amount=-CUT_EXTRUDE_45445_DEPTH, mode=Mode.SUBTRACT)

    # xt30 2 → xt30 (cut)
    # profile 1 of 2: a face of its own
    with BuildSketch(Plane.XY.offset(XT30_START)):
        with Locations((10.1, 6.35)):
            Rectangle(XT30_2_W, XT30_2_H)
        with Locations((10.1, 6.35)):
            Rectangle(XT30_2_W_2, XT30_2_H_2, mode=Mode.SUBTRACT)
    # profile 2 of 2: a face of its own
    with BuildSketch(Plane.XY.offset(XT30_START)):
        with Locations((10.1, 6.35)):
            Rectangle(XT30_2_W_2, XT30_2_H_2)
    extrude(amount=XT30_DEPTH, mode=Mode.SUBTRACT)


solid = part.part
